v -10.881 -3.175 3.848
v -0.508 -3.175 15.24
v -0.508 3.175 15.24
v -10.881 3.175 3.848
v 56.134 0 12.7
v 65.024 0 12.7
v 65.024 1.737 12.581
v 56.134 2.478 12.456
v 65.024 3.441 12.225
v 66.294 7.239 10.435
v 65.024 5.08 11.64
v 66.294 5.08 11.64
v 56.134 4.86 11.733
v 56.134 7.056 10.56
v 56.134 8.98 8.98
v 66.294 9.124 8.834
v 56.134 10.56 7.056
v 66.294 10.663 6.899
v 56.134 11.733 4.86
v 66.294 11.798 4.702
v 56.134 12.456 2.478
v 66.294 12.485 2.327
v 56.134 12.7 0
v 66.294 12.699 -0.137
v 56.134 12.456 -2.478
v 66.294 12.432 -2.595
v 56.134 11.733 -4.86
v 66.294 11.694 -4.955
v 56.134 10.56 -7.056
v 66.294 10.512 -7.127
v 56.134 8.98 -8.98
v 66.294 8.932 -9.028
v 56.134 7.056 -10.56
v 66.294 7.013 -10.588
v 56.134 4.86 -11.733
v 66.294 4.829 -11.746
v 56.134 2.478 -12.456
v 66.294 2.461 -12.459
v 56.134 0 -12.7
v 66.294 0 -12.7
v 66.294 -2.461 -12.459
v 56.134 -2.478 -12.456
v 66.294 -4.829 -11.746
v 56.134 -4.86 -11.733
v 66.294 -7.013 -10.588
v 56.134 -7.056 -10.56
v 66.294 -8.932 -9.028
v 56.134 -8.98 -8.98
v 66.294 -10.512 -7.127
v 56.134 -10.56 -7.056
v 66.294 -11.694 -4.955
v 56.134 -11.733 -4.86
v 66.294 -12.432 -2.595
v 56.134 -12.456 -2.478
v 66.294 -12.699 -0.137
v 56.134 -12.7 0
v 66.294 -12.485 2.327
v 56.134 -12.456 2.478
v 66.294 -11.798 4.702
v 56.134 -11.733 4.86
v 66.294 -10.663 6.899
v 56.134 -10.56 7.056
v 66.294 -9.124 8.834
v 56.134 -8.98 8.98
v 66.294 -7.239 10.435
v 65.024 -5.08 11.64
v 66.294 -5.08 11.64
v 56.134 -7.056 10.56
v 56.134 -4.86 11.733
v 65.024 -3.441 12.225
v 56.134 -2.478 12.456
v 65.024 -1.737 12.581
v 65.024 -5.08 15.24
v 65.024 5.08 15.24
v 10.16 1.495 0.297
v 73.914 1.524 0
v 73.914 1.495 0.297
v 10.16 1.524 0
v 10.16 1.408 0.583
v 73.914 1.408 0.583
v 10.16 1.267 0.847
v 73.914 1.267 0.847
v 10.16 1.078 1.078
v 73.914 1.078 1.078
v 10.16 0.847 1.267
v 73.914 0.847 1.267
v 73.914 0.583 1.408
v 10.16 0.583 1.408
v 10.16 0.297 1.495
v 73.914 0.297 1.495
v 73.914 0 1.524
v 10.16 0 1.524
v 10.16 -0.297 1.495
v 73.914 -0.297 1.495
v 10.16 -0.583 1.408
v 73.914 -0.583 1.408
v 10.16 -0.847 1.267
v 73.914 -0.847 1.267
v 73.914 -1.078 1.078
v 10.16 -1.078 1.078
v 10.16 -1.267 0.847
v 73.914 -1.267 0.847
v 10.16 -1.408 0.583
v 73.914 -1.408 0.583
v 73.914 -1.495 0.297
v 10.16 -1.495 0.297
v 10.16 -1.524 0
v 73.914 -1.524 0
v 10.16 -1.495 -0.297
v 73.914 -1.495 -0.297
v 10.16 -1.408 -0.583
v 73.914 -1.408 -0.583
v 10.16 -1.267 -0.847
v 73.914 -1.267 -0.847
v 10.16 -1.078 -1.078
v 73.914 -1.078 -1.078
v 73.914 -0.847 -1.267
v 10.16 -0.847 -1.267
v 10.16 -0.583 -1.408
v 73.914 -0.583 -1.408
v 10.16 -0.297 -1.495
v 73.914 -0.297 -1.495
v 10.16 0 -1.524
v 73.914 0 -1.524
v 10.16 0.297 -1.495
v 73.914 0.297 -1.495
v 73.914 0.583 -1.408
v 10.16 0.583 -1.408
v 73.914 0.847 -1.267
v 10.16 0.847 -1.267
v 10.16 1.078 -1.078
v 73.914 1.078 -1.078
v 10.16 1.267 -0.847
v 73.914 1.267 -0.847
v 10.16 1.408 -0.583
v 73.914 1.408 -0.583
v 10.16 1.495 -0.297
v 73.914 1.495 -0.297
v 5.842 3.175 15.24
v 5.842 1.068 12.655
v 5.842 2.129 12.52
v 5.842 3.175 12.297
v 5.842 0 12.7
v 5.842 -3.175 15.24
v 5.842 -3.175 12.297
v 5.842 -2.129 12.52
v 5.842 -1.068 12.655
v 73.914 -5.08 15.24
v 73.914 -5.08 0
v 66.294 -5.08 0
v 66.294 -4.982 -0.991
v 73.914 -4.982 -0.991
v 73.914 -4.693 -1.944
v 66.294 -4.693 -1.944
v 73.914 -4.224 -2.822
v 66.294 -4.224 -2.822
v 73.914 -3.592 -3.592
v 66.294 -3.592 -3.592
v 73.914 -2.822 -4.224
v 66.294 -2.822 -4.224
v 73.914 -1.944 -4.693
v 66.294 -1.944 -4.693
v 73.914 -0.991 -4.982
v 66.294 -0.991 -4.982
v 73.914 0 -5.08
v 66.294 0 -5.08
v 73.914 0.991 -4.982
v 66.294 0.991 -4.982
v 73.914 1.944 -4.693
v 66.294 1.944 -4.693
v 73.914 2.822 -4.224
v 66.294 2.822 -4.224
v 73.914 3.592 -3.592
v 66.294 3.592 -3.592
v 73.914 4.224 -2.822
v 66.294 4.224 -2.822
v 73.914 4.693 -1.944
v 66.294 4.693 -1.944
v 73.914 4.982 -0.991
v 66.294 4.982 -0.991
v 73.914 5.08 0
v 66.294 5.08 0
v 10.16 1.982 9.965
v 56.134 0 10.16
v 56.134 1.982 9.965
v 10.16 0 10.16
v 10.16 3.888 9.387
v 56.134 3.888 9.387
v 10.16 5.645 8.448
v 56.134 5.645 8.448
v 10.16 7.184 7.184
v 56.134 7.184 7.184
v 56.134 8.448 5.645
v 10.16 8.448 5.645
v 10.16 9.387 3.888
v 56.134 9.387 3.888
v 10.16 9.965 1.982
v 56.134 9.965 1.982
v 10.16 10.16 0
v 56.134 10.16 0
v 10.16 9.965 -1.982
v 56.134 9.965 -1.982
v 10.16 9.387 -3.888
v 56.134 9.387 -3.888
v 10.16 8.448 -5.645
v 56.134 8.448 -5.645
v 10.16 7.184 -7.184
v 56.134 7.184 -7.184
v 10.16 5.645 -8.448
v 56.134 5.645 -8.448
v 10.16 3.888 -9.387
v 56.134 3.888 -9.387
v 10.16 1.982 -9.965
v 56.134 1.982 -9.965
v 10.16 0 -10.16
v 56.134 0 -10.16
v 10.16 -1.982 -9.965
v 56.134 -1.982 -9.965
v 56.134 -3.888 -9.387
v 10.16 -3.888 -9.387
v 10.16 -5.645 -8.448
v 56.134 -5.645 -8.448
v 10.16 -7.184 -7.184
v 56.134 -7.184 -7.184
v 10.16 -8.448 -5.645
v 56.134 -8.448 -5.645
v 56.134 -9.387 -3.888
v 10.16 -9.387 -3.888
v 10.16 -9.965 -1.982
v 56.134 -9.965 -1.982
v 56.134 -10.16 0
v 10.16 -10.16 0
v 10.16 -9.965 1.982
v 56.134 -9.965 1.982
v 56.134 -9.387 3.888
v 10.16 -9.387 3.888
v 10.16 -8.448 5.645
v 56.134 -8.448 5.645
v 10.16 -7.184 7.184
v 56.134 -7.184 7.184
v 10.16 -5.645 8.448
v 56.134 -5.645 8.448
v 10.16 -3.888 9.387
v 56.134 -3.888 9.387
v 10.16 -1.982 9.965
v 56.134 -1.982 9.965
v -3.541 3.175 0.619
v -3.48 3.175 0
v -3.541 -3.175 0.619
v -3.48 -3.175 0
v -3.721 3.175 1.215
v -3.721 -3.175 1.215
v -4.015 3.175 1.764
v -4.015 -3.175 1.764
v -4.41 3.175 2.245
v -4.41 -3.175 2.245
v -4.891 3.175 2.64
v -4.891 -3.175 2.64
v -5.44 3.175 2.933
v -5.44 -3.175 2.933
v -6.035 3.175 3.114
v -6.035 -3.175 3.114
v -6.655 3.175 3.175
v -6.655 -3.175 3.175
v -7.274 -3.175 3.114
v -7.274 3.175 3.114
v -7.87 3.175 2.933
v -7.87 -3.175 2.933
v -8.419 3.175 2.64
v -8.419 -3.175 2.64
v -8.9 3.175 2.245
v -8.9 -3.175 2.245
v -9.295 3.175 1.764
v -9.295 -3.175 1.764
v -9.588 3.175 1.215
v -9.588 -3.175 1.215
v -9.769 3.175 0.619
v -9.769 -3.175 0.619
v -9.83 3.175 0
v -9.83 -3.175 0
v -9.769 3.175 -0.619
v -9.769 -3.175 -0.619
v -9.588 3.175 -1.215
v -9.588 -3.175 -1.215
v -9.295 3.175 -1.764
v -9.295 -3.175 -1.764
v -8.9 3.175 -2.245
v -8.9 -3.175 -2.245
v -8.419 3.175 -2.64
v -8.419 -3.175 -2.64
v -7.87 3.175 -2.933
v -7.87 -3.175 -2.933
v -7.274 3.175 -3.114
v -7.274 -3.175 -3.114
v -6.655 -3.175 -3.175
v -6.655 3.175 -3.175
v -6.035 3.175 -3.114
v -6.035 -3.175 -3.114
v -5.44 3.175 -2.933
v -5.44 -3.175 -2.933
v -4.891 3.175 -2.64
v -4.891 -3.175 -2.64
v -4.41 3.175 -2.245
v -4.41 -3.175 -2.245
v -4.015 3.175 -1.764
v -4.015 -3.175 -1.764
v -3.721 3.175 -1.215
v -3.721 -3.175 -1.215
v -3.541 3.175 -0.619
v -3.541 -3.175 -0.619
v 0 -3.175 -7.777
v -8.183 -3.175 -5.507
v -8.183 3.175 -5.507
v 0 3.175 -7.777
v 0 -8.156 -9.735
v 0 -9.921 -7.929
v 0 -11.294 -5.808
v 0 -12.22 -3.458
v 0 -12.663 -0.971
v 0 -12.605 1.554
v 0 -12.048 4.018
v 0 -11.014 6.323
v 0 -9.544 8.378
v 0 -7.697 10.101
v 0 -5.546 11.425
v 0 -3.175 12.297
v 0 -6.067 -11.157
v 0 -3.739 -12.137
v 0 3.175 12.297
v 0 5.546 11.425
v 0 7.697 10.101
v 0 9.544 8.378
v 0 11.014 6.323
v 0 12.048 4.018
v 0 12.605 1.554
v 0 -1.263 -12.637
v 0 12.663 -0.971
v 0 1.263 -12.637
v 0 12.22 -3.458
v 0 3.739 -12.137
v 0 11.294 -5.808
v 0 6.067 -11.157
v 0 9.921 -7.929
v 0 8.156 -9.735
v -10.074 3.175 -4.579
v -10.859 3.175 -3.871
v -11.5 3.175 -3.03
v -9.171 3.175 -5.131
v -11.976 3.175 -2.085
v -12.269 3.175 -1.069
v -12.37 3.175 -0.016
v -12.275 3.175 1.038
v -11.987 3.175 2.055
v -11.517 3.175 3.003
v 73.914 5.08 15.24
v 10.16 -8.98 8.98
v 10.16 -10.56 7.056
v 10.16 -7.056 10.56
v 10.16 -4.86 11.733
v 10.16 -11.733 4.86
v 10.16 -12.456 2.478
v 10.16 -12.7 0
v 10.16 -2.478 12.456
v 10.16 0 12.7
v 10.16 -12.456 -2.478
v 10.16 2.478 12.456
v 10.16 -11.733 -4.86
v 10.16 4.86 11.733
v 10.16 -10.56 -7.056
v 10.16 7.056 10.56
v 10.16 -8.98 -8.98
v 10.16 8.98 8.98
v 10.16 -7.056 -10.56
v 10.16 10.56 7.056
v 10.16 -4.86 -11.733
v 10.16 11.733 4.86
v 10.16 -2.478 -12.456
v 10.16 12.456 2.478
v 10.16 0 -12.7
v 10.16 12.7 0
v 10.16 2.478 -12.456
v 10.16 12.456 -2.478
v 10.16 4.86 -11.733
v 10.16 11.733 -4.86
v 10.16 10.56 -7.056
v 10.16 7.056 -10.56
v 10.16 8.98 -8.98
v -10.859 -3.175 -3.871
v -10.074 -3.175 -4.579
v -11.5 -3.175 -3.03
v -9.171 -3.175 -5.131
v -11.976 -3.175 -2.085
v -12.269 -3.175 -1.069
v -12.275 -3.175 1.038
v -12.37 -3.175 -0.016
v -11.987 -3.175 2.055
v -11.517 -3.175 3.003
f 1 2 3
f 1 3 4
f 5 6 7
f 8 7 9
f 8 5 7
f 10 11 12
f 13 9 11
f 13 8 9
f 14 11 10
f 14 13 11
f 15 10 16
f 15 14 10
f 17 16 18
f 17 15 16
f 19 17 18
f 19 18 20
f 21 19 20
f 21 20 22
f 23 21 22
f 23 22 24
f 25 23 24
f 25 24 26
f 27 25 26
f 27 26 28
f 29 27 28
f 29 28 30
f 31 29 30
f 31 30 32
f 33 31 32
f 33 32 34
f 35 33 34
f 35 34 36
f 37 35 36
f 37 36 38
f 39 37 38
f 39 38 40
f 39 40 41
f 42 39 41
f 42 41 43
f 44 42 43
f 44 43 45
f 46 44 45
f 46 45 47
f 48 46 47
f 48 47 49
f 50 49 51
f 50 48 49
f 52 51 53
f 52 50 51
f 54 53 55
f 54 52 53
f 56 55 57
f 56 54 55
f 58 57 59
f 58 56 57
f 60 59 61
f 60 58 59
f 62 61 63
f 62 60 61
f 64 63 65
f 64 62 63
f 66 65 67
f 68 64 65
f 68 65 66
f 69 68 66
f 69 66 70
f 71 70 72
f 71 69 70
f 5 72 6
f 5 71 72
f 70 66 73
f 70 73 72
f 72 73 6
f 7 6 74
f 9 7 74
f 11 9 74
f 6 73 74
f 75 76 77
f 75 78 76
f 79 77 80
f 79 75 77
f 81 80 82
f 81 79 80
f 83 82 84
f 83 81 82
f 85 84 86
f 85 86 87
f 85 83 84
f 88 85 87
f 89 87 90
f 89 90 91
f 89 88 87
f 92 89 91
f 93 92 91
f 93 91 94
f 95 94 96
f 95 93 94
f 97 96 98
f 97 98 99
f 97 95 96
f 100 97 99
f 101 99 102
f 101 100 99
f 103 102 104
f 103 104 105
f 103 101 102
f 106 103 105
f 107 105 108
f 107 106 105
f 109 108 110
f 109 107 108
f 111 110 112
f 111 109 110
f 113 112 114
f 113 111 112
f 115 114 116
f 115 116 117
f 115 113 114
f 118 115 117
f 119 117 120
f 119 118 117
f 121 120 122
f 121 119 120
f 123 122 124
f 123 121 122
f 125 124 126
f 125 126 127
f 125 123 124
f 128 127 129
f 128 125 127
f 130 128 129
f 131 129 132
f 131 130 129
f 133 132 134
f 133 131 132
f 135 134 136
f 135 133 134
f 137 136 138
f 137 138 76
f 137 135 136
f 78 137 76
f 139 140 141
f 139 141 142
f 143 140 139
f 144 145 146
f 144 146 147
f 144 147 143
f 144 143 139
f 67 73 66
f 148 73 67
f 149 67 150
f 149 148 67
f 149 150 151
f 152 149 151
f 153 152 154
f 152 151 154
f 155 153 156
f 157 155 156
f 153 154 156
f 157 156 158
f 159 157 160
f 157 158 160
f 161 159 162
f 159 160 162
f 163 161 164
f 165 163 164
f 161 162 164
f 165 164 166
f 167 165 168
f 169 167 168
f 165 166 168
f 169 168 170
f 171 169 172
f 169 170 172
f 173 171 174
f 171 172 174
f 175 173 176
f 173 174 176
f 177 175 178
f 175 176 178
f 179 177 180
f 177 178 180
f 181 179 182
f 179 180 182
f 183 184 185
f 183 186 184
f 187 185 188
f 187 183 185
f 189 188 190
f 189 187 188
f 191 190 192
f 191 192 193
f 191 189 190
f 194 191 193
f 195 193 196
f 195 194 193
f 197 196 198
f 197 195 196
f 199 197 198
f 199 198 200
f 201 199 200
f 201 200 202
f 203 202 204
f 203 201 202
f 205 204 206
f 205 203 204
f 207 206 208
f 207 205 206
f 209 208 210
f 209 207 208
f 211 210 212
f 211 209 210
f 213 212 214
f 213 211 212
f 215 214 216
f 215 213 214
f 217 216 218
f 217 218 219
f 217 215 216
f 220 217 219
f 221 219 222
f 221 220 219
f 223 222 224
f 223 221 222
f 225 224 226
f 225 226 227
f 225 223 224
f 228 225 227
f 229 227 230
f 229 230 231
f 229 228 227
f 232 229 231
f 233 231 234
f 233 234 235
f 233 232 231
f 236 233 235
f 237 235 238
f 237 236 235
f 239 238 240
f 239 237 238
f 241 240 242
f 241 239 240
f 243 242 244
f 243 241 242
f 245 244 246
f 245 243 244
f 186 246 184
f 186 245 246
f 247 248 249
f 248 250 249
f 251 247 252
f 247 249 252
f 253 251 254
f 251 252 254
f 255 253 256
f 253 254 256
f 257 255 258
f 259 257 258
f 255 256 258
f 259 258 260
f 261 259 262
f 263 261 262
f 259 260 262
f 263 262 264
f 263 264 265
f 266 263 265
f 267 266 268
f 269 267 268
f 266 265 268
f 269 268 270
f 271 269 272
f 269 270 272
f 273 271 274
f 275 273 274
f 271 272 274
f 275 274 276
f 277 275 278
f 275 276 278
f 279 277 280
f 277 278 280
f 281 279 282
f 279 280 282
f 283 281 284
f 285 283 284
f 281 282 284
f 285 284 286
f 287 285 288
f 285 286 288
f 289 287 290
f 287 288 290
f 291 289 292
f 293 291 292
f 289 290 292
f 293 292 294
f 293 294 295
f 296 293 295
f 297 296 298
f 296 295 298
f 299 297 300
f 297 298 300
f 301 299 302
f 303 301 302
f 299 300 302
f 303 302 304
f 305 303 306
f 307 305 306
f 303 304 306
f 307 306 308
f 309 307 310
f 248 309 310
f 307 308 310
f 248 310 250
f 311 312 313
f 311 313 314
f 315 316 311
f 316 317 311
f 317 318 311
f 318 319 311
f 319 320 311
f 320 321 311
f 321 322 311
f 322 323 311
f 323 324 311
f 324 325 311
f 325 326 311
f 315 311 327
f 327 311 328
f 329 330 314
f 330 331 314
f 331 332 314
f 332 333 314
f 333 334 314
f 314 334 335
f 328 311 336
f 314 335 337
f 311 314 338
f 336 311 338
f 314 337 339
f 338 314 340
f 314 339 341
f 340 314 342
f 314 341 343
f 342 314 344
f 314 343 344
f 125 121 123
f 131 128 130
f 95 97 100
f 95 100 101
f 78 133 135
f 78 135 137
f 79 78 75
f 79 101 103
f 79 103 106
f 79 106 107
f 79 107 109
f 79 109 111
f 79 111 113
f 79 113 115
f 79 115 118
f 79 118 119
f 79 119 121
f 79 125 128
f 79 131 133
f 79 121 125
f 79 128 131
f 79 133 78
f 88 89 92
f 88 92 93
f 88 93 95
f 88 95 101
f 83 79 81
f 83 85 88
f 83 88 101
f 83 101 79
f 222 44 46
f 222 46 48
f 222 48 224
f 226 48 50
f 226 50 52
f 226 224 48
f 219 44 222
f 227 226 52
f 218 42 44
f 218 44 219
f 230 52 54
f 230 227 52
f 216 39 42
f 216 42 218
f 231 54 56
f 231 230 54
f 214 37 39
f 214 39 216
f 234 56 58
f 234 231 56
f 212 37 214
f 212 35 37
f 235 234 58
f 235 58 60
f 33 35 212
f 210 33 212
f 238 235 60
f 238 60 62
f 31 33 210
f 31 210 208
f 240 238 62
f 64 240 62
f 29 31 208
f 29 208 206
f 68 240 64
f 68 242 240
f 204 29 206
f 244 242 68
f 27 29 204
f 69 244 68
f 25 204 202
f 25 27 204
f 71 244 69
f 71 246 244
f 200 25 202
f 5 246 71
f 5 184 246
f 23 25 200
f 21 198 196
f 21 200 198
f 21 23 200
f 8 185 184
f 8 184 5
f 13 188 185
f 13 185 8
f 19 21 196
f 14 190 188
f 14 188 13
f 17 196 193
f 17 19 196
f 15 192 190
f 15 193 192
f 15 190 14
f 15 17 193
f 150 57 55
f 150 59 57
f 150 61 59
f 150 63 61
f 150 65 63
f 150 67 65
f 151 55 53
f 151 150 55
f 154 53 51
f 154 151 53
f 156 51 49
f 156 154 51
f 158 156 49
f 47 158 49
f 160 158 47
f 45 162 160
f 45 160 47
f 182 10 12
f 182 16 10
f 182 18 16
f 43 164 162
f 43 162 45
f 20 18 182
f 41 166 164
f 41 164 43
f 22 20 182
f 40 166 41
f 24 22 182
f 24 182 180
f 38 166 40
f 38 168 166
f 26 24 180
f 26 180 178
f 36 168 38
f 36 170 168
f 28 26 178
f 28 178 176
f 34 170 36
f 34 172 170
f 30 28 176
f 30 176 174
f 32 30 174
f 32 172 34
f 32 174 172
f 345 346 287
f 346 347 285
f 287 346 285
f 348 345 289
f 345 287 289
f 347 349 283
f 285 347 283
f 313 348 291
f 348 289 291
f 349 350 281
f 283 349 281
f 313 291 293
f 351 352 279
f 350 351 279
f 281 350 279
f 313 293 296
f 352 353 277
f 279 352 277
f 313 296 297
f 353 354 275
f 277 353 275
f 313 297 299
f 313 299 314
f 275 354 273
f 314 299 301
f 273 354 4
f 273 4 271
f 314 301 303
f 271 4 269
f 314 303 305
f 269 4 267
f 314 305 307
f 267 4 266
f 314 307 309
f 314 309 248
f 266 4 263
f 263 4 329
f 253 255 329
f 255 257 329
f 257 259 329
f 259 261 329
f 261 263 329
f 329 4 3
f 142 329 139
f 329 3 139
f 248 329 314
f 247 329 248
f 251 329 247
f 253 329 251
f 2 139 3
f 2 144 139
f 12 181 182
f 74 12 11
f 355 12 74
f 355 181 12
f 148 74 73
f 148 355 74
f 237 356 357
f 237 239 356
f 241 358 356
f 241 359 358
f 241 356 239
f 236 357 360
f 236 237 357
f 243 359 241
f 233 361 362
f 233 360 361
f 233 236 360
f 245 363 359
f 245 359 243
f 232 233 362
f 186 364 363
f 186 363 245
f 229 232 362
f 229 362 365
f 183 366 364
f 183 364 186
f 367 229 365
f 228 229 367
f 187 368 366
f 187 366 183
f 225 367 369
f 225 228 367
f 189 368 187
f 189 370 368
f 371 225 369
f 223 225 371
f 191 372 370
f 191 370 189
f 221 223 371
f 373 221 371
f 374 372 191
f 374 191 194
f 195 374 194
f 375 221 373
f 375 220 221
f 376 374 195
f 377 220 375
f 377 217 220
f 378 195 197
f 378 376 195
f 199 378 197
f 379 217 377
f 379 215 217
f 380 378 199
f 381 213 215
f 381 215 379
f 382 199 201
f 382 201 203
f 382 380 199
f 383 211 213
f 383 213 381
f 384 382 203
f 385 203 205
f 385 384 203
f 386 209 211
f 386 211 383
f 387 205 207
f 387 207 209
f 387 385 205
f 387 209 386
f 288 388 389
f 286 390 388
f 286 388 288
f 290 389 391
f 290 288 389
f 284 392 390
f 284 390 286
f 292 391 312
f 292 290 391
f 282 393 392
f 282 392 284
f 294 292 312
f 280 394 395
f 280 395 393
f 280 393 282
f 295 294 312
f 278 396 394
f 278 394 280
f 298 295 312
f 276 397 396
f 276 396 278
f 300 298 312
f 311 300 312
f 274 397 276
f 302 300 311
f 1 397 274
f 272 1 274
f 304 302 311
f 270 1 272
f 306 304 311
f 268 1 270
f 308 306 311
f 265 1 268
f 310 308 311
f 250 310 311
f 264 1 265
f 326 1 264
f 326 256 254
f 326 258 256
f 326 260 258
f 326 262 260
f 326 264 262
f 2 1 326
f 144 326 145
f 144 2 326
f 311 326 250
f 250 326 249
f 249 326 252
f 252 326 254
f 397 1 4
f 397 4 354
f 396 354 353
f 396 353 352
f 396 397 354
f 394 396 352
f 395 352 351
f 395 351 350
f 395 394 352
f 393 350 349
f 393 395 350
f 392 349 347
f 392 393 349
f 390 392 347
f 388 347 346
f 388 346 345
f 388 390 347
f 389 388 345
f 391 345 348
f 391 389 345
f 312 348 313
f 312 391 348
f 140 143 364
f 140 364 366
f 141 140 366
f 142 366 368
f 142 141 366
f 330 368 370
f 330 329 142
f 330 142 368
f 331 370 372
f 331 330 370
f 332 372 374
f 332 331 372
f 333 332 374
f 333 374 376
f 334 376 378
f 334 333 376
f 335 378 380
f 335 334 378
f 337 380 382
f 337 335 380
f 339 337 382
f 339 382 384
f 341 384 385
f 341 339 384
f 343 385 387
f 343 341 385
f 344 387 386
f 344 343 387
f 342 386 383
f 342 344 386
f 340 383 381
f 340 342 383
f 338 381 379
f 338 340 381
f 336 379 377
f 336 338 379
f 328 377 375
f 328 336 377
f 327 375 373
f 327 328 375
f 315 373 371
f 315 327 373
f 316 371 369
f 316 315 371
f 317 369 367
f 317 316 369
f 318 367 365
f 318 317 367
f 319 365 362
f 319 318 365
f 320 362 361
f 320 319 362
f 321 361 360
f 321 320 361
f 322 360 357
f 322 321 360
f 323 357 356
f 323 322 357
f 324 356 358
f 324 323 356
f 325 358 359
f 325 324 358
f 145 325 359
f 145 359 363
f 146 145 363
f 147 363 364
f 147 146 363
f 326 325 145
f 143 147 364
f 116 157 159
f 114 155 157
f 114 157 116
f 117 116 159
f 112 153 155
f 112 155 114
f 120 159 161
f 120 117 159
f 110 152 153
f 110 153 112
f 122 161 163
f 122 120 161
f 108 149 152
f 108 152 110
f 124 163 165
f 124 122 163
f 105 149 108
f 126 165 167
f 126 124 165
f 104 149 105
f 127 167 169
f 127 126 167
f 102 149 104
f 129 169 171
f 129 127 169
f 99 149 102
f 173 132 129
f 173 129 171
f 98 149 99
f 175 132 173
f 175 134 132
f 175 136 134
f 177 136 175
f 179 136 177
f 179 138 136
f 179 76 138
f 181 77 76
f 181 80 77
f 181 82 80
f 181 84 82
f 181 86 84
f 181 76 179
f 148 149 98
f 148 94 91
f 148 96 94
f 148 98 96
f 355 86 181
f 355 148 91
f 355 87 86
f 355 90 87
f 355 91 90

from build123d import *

# Parameters (mm, degrees)
F0_W     = 5.842
F0_H     = 12.7
F0_R     = 3.175
F2_DEPTH = 3.175
F3_DEPTH = 3.175
F4_R     = 1.524
F5_DEPTH = 7.62
F6_DEPTH = 1.27
F7_DEPTH = 56.134


with BuildPart() as f1:
    # F0 (on Front) → F1 (revolve)
    with BuildSketch(Plane.XZ):
        with Locations((2.921, 6.35)):
            Rectangle(F0_W, F0_H)
        Polygon((5.842, 12.7), (5.842, 0), (66.294, 0), (66.294, 12.7), (56.134, 12.7), (56.134, 10.16), (10.16, 10.16), (10.16, 12.7), align=None)
    revolve(axis=Axis((33.147, 0, 0), (-1, 0, 0)))

    # F0 (on Front) → F2 (join, symmetric)
    with BuildSketch(Plane.XZ):
        with BuildLine():
            ThreePointArc((-8.1826630726, -5.5069827884), (-3.1957909266, -4.5493385486), (-0.9398, 0))
            ThreePointArc((-0.9398, 0), (-4.5919612295, 5.3297205562), (-10.8806298187, 3.8475430269))
            ThreePointArc((-10.8806298187, 3.8475430269), (-12.1459778134, -1.5837270034), (-8.1826630726, -5.5069827884))
        make_face()
        with Locations((-6.6548, 0)):
            Circle(F0_R, mode=Mode.SUBTRACT)
        with BuildLine():
            Line((-0.9398, 0), (0, 0))
            Line((0, 0), (0, 12.7))
            Line((0, 12.7), (5.842, 12.7))
            Line((5.842, 12.7), (5.842, 15.24))
            Line((5.842, 15.24), (-0.508, 15.24))
            Line((-0.508, 15.24), (-10.8806298187, 3.8475430269))
            ThreePointArc((-10.8806298187, 3.8475430269), (-4.5919612295, 5.3297205562), (-0.9398, 0))
        make_face()
        with Locations((2.921, 6.35)):
            Rectangle(F0_W, F0_H)
        with BuildLine():
            Line((5.842, 0), (0, 0))
            Line((0, 0), (-0.9398, 0))
            ThreePointArc((-0.9398, 0), (-3.1957909266, -4.5493385486), (-8.1826630726, -5.5069827884))
            Line((-8.1826630726, -5.5069827884), (5.842, -9.398))
            Line((5.842, -9.398), (5.842, 0))
        make_face()
        with Locations((-6.6548, 0)):
            Circle(F0_R)
    extrude(amount=F2_DEPTH, both=True)

    # F0 (on Front) → F3 (cut, symmetric)
    with BuildSketch(Plane.XZ):
        with Locations((-6.6548, 0)):
            Circle(F0_R)
    extrude(amount=F3_DEPTH, both=True, mode=Mode.SUBTRACT)

    # F4 (on face) → F5 (join)
    with BuildSketch(Plane.YZ.offset(66.294)):
        with BuildLine():
            ThreePointArc((-5.08, 0), (0, -5.08), (5.08, 0))
            ThreePointArc((5.08, 0), (0, 5.08), (-5.08, 0))
        make_face()
        Circle(F4_R, mode=Mode.SUBTRACT)
        with BuildLine():
            ThreePointArc((-5.08, 0), (0, 5.08), (5.08, 0))
            Line((5.08, 0), (5.08, 15.24))
            Line((5.08, 15.24), (-5.08, 15.24))
            Line((-5.08, 15.24), (-5.08, 0))
        make_face()
    extrude(amount=F5_DEPTH)

    # F6 (add): a face of the model
    f6_faces = [f1.faces().sort_by_distance(p)[0] for p in [
        (66.294, 0, 13.7792682875),
    ]]
    extrude(f6_faces, amount=F6_DEPTH)

    # F4 (on face) → F7 (cut, through all)
    with BuildSketch(Plane.YZ.offset(66.294)):
        Circle(F4_R)
    extrude(amount=-F7_DEPTH, mode=Mode.SUBTRACT)


solid = f1.part
